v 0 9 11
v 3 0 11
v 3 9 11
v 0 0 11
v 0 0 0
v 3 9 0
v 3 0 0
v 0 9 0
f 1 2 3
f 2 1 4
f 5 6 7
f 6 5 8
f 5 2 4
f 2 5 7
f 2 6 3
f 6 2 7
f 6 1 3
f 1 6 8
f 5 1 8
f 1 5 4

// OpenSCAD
// Generated by SolidPython 1.0.1 on 2020-07-29 00:02:42


cube(size = [3, 9, 11]);
/***********************************************
*********      SolidPython code:      **********
************************************************
 
# import packages: SolidPython
from solid import *
from solid.utils import *
from itertools import chain, combinations


class Resize:

    def __init__(self, scad_file):
        self.scad_file = scad_file
        #self.scad_file = import_scad(scad_file)
        # cone/cylinder param:
        self.r1 = 0
        self.r2 = 0
        self.h = 0
        # rectangular prism param:
        self.w = 0
        self.l = 0
        # ellipse param:
        self.r = 0

    # import OpenScad code (file name corresponds to shape)


    # classify shape + parameters
    def assign(self, param1, param2, param3):
        if self.scad_file == 'cone.scad':
            self.r1 = param1
            self.r2 = param2
            self.h = param3
        elif self.scad_file == 'cylinder.scad':
            self.r1 = param1
            self.r2 = param2
            self.h = param3
        elif self.scad_file == 'rectangularPrism.scad':
            self.h = param1
            self.l = param2
            self.w = param3
        else:
            self.r = param1
            self.h = param2

    # resize parameters
    def iterate(self):
        x = range(3, 20, 2)
        i = 1
        if self.scad_file == 'cone.scad':
            tempList = list(combinations(x, 3))
            #print(tempList)
            for i in x:
                for j in range (3):
                    param1 = tempList[i][0]
                    param2 = tempList[i][1]
                    param3 = tempList[i][2]
                    filepath = 'produced_scad_files/' + 'cone' + str(param1) + '_' + str(param2) + '_' + str(param3) + '.scad'
                    scad_render_to_file(cylinder(h=param1, r1=param2, r2=param3), filepath)

        elif self.scad_file == 'cylinder.scad':
            tempList = list(combinations(x, 3))
            for i in x:
                for j in range(3):
                    param1 = tempList[i][0]
                    param2 = tempList[i][1]
                    param3 = tempList[i][2]
                    filepath = 'produced_scad_files/' + 'cylinder' + str(param1) + '_' + str(param2) + '_' + str(param3) + '.scad'
                    scad_render_to_file(cylinder(h=param1, r1=param2, r2=param3), filepath)

        elif self.scad_file == 'rectangularPrism.scad':
            tempList = list(combinations(x, 3))
            for i in x:
                for j in range(3):
                    param1 = tempList[i][0]
                    param2 = tempList[i][1]
                    param3 = tempList[i][2]
                    filepath = 'produced_scad_files/' + 'rectangularPrism' + str(param1) + '_' + str(param2) + '_' + str(
                        param3) + '.scad'
                    scad_render_to_file(cube(size=(param1, param2, param3)), filepath)

        else:
            tempList = list(combinations(x, 2))
            for i in x:
                for j in range(3):
                    param1 = tempList[i][0]
                    param2 = tempList[i][1]
                    filepath = 'produced_scad_files/' + 'ellipse' + str(param1) + '_' + str(param2) + '_' + '.scad'
                    scad_render_to_file(sphere(param1, param2), filepath)

    def render_to_scadfile(self):
        scad_render_to_file(scad, 'example.scad') 
 
************************************************/
